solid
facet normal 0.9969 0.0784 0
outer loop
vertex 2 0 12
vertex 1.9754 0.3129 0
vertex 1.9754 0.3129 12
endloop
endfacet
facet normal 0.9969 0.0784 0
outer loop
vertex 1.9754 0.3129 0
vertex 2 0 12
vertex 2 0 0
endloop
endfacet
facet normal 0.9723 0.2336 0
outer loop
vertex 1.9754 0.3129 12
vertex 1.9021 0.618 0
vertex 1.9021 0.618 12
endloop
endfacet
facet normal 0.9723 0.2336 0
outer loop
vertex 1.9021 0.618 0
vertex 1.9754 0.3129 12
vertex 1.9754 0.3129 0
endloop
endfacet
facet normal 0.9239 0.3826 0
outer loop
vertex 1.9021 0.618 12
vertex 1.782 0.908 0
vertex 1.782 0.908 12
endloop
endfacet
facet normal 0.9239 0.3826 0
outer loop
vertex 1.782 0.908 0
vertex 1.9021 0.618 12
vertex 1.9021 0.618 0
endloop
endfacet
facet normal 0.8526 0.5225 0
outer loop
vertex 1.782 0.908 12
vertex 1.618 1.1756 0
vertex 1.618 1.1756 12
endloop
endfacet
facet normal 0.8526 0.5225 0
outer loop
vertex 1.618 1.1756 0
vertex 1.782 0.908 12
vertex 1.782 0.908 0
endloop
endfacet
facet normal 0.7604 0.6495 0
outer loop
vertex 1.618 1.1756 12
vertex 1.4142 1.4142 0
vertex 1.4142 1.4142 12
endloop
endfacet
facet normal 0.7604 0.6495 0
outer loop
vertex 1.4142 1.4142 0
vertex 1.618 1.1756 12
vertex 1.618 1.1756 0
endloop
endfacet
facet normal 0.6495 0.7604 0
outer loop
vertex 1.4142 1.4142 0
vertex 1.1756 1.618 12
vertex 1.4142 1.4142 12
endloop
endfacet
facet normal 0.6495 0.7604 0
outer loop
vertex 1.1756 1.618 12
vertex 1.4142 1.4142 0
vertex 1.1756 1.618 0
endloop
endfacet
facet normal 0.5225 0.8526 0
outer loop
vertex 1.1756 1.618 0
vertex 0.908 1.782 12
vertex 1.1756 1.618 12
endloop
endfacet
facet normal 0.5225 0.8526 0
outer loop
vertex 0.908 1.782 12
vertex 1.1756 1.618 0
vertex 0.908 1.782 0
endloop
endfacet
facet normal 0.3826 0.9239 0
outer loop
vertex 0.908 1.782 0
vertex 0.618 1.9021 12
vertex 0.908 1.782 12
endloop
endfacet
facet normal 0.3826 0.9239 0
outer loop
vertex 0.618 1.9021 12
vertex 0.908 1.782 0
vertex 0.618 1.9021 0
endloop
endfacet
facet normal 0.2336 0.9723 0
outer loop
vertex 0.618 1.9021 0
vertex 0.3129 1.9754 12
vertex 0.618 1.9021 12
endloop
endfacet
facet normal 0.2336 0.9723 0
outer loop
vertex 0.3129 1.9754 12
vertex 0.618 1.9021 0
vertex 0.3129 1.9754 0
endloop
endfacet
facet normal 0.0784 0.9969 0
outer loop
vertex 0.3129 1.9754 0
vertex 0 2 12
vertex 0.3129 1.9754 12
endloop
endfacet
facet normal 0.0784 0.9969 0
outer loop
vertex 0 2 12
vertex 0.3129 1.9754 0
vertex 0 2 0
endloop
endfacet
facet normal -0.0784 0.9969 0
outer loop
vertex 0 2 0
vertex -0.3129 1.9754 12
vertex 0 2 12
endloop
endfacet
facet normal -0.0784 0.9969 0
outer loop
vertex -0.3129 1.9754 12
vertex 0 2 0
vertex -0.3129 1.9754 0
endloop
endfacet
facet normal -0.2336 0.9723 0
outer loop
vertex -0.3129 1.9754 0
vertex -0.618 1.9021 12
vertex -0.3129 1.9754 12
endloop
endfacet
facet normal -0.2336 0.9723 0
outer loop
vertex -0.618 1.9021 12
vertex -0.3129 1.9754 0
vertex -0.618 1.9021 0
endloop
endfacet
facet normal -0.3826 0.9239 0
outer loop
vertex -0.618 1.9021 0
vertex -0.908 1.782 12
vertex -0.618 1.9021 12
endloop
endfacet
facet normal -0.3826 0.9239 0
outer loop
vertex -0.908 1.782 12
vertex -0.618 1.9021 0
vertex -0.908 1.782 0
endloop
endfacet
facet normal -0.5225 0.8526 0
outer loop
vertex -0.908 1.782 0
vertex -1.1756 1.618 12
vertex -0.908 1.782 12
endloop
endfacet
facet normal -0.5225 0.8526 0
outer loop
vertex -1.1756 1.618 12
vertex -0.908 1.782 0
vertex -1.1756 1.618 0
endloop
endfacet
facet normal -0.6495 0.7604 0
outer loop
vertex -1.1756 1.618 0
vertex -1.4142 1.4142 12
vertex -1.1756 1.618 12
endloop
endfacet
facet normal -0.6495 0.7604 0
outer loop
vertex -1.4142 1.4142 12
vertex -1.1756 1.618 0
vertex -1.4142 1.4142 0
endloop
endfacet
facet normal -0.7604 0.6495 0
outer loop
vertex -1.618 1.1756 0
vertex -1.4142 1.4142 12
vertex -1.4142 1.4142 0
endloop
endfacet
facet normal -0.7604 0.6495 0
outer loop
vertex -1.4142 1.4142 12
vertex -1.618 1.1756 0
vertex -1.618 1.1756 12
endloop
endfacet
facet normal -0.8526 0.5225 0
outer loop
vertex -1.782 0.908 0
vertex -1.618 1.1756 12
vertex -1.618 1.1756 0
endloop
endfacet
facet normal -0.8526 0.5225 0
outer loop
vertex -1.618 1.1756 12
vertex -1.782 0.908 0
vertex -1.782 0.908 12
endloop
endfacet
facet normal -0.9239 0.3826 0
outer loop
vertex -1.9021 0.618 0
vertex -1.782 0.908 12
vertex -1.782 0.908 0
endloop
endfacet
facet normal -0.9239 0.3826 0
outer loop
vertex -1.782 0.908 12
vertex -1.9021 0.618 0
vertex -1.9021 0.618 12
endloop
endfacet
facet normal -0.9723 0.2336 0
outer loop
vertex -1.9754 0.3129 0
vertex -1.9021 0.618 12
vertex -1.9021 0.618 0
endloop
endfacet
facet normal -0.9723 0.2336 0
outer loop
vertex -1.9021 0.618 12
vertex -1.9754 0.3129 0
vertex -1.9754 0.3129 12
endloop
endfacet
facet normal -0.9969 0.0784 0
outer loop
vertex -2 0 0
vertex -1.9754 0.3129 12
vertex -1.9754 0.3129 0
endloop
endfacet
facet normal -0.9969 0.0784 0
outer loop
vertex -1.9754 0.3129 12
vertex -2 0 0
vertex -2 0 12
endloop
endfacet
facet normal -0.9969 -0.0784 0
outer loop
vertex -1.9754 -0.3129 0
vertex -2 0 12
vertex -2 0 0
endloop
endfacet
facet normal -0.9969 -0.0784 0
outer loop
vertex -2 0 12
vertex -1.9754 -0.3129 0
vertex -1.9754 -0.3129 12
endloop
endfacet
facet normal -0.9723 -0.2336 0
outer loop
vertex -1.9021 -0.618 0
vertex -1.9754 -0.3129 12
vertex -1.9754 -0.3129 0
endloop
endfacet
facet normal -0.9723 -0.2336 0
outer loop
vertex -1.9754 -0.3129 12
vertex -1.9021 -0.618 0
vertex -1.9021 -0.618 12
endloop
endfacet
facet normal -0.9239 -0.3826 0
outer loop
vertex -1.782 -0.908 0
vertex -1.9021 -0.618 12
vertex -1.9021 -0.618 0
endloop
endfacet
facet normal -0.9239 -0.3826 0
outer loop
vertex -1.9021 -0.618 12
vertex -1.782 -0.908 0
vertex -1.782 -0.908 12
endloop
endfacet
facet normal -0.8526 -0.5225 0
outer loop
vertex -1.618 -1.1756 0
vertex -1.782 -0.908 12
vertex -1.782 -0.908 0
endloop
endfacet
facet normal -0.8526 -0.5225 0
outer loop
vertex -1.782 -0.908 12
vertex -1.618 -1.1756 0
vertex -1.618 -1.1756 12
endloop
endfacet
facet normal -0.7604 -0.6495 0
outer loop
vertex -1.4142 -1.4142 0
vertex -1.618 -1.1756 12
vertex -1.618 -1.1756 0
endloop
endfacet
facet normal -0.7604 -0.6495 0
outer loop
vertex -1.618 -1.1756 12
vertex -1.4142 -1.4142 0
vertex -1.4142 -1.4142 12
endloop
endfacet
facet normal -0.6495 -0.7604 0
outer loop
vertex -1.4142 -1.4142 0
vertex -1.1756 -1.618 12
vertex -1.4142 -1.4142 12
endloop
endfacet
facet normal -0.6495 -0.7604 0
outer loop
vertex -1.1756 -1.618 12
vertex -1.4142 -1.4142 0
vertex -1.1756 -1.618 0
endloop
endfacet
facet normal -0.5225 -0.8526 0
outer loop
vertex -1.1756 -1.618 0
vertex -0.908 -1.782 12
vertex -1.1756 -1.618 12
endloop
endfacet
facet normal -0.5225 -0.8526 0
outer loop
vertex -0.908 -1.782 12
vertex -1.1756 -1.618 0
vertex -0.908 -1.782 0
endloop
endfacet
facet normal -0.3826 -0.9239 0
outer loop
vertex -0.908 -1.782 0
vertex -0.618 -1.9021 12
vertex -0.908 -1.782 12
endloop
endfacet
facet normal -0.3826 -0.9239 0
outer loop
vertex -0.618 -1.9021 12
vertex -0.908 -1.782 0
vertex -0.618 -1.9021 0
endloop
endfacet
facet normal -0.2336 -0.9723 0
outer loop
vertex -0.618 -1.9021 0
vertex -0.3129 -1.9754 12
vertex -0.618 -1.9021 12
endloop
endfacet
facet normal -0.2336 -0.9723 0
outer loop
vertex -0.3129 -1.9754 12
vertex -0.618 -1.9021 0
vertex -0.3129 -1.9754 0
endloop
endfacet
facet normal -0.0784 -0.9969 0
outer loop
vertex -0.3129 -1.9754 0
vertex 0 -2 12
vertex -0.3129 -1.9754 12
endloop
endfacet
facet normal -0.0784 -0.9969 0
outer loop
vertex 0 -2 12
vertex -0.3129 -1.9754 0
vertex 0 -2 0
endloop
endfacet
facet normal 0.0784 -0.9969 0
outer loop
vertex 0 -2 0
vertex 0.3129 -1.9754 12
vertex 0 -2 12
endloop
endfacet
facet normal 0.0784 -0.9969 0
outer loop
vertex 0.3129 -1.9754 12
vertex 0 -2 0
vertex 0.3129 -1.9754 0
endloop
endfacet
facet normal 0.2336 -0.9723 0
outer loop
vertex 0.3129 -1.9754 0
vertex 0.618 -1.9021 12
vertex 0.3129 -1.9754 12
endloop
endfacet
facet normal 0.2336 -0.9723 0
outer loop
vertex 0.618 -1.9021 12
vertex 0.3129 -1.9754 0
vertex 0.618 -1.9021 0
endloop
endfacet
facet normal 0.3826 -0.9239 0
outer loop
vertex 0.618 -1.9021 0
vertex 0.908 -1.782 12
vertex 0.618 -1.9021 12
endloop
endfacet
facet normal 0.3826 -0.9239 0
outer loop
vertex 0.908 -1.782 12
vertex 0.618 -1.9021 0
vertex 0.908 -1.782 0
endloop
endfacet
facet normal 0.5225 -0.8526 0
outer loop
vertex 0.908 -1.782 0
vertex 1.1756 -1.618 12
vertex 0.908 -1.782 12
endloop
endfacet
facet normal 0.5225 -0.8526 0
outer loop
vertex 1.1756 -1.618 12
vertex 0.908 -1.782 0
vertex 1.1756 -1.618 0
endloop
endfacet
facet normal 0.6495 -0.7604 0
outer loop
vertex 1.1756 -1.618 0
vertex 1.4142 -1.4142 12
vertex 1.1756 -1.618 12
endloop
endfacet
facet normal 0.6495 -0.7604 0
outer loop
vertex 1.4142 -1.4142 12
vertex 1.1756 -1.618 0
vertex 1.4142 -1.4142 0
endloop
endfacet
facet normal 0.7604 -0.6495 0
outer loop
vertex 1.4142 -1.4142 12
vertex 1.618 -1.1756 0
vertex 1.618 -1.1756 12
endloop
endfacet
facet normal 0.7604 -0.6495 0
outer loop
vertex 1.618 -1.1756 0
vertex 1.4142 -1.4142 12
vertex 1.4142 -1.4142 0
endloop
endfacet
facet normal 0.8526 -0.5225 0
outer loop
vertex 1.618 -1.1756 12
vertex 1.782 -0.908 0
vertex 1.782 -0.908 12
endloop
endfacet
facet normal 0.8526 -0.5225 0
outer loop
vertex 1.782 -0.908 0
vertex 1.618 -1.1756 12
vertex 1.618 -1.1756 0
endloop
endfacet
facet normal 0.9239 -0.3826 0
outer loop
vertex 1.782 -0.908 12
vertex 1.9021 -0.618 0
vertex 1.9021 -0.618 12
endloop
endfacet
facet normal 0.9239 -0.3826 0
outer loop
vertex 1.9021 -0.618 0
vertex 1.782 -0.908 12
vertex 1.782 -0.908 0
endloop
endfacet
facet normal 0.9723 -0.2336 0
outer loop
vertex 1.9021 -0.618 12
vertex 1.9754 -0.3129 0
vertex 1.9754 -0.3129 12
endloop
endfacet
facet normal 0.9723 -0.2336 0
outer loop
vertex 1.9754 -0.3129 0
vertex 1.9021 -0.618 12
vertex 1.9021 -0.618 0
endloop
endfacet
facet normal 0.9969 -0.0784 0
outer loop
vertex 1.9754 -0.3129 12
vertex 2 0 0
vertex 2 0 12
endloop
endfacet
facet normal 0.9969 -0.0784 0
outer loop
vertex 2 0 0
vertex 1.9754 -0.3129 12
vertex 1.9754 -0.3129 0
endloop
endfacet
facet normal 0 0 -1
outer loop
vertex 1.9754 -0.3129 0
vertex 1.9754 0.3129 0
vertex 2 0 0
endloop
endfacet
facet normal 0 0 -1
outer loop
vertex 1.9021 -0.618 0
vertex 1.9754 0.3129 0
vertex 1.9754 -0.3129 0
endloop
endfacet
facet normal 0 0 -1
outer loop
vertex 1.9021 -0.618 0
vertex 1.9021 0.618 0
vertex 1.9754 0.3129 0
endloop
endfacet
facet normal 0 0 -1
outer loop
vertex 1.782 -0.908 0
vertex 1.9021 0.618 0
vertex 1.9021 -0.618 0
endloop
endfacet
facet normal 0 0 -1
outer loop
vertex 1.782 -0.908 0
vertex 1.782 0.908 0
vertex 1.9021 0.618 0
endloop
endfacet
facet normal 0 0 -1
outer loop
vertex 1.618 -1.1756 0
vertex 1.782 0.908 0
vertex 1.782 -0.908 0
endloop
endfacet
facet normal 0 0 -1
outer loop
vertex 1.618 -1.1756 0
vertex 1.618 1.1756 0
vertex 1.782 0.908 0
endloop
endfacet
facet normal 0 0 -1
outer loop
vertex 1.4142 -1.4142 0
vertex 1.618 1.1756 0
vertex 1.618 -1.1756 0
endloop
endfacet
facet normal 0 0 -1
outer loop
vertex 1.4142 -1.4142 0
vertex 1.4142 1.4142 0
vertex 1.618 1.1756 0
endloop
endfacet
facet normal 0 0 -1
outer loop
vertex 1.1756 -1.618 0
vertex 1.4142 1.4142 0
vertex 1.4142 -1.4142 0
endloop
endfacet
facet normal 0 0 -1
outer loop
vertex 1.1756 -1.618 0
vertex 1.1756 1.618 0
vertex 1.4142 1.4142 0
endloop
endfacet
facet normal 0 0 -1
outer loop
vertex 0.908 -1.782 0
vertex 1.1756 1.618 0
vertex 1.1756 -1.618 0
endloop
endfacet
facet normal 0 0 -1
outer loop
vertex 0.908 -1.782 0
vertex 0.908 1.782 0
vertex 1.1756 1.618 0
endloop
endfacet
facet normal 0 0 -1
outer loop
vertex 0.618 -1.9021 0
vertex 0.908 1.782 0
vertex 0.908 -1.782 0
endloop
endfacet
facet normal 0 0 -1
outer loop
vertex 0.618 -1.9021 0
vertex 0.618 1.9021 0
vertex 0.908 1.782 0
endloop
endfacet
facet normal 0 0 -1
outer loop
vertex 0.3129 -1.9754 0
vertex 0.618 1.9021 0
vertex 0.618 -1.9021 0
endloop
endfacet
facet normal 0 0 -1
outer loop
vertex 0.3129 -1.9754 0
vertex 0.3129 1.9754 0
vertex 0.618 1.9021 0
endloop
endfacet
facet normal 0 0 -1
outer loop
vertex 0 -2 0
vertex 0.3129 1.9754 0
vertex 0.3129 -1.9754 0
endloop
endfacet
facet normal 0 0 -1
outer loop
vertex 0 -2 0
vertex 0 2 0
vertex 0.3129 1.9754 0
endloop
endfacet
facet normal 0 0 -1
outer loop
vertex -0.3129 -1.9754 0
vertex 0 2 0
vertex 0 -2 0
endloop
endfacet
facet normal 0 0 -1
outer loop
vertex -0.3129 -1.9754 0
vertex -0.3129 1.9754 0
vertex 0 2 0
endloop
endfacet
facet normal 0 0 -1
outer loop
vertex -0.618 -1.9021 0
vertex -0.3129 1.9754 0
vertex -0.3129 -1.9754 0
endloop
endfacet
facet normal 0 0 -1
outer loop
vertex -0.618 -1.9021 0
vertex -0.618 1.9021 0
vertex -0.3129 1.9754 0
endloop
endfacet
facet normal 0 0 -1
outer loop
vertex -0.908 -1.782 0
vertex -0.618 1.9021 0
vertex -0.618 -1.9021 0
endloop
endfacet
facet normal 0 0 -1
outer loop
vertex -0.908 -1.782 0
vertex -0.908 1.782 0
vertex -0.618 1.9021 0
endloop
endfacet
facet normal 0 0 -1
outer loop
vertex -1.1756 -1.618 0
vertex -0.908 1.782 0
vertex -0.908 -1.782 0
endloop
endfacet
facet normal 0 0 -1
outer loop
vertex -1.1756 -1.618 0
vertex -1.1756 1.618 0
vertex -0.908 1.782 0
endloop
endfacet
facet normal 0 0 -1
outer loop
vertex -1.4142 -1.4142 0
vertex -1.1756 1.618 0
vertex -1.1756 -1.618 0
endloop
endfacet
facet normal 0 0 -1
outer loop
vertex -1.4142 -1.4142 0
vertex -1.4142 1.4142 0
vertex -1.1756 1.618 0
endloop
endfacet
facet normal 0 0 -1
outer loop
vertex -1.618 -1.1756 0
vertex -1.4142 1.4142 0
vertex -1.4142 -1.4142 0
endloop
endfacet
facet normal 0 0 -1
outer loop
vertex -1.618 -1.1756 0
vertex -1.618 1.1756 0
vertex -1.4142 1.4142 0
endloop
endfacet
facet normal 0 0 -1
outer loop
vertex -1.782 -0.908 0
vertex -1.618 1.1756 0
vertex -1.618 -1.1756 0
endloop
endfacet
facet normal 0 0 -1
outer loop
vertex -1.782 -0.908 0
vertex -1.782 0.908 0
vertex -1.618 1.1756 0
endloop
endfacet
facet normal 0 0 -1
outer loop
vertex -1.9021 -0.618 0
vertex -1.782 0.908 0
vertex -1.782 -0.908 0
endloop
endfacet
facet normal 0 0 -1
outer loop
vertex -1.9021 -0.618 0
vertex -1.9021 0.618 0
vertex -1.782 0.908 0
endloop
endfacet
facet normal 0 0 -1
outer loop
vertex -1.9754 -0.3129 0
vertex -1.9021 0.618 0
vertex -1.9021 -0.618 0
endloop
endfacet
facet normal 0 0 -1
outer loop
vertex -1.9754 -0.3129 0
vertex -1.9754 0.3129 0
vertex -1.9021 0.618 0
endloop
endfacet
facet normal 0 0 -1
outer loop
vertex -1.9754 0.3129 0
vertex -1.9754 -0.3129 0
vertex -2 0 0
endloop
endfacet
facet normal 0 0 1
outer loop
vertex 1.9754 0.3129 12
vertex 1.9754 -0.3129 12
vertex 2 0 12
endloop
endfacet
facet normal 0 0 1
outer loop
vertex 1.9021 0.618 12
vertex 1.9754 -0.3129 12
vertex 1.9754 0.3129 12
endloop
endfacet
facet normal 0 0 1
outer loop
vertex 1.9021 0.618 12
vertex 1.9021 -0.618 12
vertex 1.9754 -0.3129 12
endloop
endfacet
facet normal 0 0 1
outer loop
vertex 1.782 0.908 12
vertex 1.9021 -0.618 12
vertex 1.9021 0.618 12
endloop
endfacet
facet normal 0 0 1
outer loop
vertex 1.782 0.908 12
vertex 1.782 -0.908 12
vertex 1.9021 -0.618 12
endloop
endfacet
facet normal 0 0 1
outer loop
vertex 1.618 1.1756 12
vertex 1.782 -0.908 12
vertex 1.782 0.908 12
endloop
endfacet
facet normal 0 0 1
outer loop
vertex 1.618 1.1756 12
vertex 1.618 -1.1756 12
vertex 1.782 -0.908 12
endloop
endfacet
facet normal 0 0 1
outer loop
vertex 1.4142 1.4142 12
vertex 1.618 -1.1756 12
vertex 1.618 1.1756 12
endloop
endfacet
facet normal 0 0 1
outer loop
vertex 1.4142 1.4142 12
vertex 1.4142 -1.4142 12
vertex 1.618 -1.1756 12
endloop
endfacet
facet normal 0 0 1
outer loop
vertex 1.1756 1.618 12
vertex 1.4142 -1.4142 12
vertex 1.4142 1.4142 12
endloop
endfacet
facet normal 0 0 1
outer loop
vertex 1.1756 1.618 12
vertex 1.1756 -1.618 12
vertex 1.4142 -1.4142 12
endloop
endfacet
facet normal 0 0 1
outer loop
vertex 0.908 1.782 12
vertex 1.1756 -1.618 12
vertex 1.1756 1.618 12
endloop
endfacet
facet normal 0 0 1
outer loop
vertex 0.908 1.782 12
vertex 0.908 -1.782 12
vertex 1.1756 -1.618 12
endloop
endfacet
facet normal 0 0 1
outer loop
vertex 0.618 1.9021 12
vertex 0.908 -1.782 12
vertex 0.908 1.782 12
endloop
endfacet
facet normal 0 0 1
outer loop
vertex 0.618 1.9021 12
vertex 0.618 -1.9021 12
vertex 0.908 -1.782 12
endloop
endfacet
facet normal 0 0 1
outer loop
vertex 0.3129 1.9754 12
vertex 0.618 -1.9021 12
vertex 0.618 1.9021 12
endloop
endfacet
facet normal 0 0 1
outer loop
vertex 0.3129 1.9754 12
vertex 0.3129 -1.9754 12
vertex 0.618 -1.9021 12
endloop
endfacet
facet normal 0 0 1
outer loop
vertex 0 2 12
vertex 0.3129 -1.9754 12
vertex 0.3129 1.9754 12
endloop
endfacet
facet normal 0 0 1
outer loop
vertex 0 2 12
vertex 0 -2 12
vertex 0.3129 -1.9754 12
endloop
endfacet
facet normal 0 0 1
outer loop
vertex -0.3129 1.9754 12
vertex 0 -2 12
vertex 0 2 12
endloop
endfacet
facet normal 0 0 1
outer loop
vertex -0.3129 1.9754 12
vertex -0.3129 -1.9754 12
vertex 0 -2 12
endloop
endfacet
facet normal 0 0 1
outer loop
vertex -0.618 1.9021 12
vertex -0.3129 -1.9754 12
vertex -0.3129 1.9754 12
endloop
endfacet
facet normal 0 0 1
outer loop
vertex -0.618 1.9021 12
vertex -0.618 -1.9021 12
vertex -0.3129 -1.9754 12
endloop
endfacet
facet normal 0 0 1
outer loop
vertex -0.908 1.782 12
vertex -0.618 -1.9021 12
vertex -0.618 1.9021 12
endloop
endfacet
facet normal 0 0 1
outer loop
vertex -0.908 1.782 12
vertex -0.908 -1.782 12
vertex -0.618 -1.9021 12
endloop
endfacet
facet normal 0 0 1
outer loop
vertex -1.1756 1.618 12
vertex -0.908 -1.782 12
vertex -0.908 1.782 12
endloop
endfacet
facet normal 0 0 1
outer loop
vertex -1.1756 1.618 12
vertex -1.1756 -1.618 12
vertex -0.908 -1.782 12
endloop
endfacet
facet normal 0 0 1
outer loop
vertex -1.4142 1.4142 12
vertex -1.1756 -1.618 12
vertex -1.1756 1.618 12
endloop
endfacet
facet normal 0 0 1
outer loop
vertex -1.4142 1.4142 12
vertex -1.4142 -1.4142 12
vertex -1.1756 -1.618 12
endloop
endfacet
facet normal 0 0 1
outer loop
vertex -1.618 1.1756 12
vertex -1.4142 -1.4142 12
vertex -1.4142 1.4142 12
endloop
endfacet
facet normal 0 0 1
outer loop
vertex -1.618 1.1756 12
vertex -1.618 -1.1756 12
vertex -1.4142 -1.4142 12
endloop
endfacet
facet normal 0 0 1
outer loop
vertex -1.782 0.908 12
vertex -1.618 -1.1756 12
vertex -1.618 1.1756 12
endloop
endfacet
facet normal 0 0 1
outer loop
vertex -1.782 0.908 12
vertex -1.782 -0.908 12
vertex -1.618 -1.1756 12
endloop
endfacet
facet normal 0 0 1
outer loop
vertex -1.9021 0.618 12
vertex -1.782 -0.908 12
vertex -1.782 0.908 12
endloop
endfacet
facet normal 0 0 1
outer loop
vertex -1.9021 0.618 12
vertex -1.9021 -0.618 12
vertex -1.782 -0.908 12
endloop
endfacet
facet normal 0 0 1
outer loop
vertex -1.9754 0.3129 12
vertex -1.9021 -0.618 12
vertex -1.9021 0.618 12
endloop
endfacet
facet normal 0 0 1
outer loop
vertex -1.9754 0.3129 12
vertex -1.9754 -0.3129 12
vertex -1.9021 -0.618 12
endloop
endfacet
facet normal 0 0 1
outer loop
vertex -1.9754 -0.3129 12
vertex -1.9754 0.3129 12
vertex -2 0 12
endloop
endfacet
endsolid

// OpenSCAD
// Volume: 150.17703875668587, SurfaceArea: 175.67094634247235
cylinder(r = 2, h = 12, $fn = 40);
